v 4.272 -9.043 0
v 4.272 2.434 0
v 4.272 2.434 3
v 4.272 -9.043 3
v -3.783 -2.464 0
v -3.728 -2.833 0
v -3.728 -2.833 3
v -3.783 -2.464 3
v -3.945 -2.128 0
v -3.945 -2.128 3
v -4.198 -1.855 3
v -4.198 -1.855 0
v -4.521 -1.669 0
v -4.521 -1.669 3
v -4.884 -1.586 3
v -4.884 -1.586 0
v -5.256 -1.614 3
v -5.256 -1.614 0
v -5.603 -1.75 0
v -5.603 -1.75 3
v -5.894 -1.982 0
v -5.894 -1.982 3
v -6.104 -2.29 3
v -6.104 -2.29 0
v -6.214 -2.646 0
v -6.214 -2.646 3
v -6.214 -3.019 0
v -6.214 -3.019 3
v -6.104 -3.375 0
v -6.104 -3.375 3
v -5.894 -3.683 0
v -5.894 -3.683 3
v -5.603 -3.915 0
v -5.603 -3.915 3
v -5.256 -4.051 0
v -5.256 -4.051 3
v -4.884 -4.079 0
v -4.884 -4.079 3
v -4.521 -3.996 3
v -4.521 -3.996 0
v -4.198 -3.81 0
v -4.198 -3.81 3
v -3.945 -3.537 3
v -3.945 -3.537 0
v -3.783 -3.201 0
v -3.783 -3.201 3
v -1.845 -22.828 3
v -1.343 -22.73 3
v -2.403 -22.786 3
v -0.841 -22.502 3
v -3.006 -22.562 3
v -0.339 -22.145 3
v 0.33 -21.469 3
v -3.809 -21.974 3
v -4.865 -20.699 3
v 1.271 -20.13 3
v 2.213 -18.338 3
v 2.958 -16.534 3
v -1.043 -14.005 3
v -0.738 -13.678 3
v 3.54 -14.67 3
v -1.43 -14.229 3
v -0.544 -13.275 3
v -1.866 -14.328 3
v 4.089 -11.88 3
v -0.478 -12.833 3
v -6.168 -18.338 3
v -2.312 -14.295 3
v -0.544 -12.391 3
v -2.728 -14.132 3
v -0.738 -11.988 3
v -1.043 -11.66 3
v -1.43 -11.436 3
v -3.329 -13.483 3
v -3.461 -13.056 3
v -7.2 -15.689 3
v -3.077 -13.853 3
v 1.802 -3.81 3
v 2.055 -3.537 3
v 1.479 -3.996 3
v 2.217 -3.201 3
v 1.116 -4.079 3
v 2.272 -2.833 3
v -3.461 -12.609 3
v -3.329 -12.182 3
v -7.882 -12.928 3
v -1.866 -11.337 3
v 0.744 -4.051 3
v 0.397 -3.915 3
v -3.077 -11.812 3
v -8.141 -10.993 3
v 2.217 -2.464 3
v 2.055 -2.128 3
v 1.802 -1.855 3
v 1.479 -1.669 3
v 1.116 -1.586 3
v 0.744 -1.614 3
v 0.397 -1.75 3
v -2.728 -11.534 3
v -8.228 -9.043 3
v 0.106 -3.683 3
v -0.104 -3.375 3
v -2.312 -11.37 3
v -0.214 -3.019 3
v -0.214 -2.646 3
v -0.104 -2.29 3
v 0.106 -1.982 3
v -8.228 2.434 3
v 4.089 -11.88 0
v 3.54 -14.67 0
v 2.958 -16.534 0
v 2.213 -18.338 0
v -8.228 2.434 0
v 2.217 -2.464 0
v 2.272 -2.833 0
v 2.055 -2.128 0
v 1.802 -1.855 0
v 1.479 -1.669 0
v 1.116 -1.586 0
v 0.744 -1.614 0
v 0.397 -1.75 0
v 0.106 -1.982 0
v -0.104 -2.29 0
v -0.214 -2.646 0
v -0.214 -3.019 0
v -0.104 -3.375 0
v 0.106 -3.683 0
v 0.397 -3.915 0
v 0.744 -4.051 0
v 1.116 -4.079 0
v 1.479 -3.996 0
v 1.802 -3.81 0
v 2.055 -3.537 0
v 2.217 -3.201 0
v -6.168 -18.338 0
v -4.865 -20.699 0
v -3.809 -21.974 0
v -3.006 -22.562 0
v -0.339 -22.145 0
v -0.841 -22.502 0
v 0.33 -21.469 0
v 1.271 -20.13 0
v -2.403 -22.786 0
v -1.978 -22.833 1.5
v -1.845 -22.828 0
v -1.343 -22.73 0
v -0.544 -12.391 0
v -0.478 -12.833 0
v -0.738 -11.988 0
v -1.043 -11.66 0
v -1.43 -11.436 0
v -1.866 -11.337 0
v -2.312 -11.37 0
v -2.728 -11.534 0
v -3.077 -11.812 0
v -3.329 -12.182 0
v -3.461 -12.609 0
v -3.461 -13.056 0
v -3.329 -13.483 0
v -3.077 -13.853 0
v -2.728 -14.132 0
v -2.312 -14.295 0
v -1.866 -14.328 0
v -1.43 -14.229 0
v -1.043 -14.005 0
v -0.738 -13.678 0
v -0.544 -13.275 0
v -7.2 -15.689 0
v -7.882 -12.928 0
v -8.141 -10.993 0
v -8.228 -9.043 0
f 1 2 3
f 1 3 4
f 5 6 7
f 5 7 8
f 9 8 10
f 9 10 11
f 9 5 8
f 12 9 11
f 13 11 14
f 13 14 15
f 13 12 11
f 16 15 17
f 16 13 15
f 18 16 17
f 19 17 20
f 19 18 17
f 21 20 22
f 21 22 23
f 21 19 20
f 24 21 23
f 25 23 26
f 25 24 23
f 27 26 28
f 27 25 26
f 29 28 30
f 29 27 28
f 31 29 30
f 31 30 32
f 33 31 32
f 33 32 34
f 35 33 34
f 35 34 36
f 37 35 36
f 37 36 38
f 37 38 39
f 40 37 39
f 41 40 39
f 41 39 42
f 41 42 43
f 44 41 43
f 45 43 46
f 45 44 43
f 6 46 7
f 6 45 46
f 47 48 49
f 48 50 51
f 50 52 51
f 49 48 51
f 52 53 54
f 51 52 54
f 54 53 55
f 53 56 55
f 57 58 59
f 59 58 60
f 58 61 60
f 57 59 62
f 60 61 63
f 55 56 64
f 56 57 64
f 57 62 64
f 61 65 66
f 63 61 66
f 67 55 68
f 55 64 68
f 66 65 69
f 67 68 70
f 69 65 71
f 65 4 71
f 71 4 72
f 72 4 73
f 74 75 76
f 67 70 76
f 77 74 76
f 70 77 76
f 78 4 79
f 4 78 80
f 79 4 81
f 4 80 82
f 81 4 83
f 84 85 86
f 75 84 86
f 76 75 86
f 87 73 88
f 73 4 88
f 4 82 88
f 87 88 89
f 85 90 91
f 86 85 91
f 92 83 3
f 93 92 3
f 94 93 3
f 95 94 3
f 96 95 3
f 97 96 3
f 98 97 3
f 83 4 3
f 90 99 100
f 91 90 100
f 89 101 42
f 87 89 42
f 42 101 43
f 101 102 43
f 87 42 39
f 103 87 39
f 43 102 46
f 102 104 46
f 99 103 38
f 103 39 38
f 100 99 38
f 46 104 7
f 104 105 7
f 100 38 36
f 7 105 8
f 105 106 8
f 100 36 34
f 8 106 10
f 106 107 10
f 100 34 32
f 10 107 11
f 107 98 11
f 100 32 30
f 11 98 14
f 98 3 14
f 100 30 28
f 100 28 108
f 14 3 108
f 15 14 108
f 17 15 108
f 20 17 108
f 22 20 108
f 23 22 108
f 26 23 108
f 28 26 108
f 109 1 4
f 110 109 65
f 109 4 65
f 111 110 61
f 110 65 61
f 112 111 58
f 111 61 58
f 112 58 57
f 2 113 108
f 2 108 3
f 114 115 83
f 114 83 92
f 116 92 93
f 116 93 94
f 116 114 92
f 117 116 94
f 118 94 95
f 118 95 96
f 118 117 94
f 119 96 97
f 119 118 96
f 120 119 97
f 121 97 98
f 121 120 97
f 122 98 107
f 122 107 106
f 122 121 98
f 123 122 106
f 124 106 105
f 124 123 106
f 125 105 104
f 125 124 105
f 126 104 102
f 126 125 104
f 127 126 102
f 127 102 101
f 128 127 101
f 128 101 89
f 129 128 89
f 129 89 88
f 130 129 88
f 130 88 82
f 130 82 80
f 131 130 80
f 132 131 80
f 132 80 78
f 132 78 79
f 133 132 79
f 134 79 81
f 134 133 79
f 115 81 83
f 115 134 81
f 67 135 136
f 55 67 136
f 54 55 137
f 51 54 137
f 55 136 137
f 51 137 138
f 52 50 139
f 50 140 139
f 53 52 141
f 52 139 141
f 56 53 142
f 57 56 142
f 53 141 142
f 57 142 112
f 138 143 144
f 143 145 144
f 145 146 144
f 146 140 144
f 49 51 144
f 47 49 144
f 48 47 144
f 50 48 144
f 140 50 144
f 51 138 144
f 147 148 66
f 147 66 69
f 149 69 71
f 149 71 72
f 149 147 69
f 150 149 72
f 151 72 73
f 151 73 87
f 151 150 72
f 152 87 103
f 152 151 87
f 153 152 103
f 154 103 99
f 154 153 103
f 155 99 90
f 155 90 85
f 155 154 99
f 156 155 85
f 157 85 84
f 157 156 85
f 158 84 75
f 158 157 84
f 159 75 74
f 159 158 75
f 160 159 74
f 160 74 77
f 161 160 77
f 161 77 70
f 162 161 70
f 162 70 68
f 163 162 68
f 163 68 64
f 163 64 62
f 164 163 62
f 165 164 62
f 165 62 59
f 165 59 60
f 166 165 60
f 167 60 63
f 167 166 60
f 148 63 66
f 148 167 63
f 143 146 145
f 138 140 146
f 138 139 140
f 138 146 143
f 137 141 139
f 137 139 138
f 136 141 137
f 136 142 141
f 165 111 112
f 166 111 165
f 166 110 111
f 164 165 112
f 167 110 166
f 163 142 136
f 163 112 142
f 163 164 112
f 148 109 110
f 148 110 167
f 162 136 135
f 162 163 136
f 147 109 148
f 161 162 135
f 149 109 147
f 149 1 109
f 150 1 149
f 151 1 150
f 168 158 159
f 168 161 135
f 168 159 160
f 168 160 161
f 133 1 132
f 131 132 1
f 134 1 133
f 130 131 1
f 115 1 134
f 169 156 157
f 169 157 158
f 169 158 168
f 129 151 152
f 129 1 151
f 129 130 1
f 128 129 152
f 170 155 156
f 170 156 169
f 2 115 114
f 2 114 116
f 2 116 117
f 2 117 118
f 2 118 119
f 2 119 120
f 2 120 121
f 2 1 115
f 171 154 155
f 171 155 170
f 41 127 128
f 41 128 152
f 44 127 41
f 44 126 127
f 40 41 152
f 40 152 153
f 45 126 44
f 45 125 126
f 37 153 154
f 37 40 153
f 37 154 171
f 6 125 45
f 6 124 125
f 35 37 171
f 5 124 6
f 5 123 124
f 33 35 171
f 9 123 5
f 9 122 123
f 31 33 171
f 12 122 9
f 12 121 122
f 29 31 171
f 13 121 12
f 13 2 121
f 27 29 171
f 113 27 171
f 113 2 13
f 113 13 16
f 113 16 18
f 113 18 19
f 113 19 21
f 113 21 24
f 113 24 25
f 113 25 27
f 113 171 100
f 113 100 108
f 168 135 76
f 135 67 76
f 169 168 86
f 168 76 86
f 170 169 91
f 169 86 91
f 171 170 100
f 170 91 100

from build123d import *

# Parameters (mm, degrees)
ESQUISSE1_R        = 1.25
ESQUISSE1_R_2      = 1.5
BOSS_EXTRU_1_DEPTH = 3
CONG_3_R           = 22
CONG_4_R           = 22


with BuildPart() as part:
    # Esquisse1 → Boss.-Extru.1 (new body)
    with BuildSketch(Plane.XY):
        with BuildLine():
            Line((-8.227794557, 2.434117026), (4.272205443, 2.434117026))
            Line((4.272205443, 2.434117026), (4.272205443, -12.832640321))
            add(Edge.make_bspline(
                [(-8.227794557, -12.832640321), (-1.977794557, -32.832640321), (4.272205443, -12.832640321)],
                knots=[0, 0, 0, 1, 1, 1], degree=2))
            Line((-8.227794557, -12.832640321), (-8.227794557, 2.434117026))
        make_face()
        with Locations((-4.977794557, -2.832640321)):
            Circle(ESQUISSE1_R, mode=Mode.SUBTRACT)
        with Locations((1.022205443, -2.832640321)):
            Circle(ESQUISSE1_R, mode=Mode.SUBTRACT)
        with Locations((-1.977794557, -12.832640321)):
            Circle(ESQUISSE1_R_2, mode=Mode.SUBTRACT)
    extrude(amount=BOSS_EXTRU_1_DEPTH)

    # Congé3
    cong_3_edges = [part.edges().sort_by_distance(p)[0] for p in [
        (4.272205443, -12.832640321, 1.5),
    ]]
    fillet(cong_3_edges, radius=CONG_3_R)

    # Congé4
    cong_4_edges = [part.edges().sort_by_distance(p)[0] for p in [
        (-8.227794557, -12.832640321, 1.5),
    ]]
    fillet(cong_4_edges, radius=CONG_4_R)


solid = part.part
